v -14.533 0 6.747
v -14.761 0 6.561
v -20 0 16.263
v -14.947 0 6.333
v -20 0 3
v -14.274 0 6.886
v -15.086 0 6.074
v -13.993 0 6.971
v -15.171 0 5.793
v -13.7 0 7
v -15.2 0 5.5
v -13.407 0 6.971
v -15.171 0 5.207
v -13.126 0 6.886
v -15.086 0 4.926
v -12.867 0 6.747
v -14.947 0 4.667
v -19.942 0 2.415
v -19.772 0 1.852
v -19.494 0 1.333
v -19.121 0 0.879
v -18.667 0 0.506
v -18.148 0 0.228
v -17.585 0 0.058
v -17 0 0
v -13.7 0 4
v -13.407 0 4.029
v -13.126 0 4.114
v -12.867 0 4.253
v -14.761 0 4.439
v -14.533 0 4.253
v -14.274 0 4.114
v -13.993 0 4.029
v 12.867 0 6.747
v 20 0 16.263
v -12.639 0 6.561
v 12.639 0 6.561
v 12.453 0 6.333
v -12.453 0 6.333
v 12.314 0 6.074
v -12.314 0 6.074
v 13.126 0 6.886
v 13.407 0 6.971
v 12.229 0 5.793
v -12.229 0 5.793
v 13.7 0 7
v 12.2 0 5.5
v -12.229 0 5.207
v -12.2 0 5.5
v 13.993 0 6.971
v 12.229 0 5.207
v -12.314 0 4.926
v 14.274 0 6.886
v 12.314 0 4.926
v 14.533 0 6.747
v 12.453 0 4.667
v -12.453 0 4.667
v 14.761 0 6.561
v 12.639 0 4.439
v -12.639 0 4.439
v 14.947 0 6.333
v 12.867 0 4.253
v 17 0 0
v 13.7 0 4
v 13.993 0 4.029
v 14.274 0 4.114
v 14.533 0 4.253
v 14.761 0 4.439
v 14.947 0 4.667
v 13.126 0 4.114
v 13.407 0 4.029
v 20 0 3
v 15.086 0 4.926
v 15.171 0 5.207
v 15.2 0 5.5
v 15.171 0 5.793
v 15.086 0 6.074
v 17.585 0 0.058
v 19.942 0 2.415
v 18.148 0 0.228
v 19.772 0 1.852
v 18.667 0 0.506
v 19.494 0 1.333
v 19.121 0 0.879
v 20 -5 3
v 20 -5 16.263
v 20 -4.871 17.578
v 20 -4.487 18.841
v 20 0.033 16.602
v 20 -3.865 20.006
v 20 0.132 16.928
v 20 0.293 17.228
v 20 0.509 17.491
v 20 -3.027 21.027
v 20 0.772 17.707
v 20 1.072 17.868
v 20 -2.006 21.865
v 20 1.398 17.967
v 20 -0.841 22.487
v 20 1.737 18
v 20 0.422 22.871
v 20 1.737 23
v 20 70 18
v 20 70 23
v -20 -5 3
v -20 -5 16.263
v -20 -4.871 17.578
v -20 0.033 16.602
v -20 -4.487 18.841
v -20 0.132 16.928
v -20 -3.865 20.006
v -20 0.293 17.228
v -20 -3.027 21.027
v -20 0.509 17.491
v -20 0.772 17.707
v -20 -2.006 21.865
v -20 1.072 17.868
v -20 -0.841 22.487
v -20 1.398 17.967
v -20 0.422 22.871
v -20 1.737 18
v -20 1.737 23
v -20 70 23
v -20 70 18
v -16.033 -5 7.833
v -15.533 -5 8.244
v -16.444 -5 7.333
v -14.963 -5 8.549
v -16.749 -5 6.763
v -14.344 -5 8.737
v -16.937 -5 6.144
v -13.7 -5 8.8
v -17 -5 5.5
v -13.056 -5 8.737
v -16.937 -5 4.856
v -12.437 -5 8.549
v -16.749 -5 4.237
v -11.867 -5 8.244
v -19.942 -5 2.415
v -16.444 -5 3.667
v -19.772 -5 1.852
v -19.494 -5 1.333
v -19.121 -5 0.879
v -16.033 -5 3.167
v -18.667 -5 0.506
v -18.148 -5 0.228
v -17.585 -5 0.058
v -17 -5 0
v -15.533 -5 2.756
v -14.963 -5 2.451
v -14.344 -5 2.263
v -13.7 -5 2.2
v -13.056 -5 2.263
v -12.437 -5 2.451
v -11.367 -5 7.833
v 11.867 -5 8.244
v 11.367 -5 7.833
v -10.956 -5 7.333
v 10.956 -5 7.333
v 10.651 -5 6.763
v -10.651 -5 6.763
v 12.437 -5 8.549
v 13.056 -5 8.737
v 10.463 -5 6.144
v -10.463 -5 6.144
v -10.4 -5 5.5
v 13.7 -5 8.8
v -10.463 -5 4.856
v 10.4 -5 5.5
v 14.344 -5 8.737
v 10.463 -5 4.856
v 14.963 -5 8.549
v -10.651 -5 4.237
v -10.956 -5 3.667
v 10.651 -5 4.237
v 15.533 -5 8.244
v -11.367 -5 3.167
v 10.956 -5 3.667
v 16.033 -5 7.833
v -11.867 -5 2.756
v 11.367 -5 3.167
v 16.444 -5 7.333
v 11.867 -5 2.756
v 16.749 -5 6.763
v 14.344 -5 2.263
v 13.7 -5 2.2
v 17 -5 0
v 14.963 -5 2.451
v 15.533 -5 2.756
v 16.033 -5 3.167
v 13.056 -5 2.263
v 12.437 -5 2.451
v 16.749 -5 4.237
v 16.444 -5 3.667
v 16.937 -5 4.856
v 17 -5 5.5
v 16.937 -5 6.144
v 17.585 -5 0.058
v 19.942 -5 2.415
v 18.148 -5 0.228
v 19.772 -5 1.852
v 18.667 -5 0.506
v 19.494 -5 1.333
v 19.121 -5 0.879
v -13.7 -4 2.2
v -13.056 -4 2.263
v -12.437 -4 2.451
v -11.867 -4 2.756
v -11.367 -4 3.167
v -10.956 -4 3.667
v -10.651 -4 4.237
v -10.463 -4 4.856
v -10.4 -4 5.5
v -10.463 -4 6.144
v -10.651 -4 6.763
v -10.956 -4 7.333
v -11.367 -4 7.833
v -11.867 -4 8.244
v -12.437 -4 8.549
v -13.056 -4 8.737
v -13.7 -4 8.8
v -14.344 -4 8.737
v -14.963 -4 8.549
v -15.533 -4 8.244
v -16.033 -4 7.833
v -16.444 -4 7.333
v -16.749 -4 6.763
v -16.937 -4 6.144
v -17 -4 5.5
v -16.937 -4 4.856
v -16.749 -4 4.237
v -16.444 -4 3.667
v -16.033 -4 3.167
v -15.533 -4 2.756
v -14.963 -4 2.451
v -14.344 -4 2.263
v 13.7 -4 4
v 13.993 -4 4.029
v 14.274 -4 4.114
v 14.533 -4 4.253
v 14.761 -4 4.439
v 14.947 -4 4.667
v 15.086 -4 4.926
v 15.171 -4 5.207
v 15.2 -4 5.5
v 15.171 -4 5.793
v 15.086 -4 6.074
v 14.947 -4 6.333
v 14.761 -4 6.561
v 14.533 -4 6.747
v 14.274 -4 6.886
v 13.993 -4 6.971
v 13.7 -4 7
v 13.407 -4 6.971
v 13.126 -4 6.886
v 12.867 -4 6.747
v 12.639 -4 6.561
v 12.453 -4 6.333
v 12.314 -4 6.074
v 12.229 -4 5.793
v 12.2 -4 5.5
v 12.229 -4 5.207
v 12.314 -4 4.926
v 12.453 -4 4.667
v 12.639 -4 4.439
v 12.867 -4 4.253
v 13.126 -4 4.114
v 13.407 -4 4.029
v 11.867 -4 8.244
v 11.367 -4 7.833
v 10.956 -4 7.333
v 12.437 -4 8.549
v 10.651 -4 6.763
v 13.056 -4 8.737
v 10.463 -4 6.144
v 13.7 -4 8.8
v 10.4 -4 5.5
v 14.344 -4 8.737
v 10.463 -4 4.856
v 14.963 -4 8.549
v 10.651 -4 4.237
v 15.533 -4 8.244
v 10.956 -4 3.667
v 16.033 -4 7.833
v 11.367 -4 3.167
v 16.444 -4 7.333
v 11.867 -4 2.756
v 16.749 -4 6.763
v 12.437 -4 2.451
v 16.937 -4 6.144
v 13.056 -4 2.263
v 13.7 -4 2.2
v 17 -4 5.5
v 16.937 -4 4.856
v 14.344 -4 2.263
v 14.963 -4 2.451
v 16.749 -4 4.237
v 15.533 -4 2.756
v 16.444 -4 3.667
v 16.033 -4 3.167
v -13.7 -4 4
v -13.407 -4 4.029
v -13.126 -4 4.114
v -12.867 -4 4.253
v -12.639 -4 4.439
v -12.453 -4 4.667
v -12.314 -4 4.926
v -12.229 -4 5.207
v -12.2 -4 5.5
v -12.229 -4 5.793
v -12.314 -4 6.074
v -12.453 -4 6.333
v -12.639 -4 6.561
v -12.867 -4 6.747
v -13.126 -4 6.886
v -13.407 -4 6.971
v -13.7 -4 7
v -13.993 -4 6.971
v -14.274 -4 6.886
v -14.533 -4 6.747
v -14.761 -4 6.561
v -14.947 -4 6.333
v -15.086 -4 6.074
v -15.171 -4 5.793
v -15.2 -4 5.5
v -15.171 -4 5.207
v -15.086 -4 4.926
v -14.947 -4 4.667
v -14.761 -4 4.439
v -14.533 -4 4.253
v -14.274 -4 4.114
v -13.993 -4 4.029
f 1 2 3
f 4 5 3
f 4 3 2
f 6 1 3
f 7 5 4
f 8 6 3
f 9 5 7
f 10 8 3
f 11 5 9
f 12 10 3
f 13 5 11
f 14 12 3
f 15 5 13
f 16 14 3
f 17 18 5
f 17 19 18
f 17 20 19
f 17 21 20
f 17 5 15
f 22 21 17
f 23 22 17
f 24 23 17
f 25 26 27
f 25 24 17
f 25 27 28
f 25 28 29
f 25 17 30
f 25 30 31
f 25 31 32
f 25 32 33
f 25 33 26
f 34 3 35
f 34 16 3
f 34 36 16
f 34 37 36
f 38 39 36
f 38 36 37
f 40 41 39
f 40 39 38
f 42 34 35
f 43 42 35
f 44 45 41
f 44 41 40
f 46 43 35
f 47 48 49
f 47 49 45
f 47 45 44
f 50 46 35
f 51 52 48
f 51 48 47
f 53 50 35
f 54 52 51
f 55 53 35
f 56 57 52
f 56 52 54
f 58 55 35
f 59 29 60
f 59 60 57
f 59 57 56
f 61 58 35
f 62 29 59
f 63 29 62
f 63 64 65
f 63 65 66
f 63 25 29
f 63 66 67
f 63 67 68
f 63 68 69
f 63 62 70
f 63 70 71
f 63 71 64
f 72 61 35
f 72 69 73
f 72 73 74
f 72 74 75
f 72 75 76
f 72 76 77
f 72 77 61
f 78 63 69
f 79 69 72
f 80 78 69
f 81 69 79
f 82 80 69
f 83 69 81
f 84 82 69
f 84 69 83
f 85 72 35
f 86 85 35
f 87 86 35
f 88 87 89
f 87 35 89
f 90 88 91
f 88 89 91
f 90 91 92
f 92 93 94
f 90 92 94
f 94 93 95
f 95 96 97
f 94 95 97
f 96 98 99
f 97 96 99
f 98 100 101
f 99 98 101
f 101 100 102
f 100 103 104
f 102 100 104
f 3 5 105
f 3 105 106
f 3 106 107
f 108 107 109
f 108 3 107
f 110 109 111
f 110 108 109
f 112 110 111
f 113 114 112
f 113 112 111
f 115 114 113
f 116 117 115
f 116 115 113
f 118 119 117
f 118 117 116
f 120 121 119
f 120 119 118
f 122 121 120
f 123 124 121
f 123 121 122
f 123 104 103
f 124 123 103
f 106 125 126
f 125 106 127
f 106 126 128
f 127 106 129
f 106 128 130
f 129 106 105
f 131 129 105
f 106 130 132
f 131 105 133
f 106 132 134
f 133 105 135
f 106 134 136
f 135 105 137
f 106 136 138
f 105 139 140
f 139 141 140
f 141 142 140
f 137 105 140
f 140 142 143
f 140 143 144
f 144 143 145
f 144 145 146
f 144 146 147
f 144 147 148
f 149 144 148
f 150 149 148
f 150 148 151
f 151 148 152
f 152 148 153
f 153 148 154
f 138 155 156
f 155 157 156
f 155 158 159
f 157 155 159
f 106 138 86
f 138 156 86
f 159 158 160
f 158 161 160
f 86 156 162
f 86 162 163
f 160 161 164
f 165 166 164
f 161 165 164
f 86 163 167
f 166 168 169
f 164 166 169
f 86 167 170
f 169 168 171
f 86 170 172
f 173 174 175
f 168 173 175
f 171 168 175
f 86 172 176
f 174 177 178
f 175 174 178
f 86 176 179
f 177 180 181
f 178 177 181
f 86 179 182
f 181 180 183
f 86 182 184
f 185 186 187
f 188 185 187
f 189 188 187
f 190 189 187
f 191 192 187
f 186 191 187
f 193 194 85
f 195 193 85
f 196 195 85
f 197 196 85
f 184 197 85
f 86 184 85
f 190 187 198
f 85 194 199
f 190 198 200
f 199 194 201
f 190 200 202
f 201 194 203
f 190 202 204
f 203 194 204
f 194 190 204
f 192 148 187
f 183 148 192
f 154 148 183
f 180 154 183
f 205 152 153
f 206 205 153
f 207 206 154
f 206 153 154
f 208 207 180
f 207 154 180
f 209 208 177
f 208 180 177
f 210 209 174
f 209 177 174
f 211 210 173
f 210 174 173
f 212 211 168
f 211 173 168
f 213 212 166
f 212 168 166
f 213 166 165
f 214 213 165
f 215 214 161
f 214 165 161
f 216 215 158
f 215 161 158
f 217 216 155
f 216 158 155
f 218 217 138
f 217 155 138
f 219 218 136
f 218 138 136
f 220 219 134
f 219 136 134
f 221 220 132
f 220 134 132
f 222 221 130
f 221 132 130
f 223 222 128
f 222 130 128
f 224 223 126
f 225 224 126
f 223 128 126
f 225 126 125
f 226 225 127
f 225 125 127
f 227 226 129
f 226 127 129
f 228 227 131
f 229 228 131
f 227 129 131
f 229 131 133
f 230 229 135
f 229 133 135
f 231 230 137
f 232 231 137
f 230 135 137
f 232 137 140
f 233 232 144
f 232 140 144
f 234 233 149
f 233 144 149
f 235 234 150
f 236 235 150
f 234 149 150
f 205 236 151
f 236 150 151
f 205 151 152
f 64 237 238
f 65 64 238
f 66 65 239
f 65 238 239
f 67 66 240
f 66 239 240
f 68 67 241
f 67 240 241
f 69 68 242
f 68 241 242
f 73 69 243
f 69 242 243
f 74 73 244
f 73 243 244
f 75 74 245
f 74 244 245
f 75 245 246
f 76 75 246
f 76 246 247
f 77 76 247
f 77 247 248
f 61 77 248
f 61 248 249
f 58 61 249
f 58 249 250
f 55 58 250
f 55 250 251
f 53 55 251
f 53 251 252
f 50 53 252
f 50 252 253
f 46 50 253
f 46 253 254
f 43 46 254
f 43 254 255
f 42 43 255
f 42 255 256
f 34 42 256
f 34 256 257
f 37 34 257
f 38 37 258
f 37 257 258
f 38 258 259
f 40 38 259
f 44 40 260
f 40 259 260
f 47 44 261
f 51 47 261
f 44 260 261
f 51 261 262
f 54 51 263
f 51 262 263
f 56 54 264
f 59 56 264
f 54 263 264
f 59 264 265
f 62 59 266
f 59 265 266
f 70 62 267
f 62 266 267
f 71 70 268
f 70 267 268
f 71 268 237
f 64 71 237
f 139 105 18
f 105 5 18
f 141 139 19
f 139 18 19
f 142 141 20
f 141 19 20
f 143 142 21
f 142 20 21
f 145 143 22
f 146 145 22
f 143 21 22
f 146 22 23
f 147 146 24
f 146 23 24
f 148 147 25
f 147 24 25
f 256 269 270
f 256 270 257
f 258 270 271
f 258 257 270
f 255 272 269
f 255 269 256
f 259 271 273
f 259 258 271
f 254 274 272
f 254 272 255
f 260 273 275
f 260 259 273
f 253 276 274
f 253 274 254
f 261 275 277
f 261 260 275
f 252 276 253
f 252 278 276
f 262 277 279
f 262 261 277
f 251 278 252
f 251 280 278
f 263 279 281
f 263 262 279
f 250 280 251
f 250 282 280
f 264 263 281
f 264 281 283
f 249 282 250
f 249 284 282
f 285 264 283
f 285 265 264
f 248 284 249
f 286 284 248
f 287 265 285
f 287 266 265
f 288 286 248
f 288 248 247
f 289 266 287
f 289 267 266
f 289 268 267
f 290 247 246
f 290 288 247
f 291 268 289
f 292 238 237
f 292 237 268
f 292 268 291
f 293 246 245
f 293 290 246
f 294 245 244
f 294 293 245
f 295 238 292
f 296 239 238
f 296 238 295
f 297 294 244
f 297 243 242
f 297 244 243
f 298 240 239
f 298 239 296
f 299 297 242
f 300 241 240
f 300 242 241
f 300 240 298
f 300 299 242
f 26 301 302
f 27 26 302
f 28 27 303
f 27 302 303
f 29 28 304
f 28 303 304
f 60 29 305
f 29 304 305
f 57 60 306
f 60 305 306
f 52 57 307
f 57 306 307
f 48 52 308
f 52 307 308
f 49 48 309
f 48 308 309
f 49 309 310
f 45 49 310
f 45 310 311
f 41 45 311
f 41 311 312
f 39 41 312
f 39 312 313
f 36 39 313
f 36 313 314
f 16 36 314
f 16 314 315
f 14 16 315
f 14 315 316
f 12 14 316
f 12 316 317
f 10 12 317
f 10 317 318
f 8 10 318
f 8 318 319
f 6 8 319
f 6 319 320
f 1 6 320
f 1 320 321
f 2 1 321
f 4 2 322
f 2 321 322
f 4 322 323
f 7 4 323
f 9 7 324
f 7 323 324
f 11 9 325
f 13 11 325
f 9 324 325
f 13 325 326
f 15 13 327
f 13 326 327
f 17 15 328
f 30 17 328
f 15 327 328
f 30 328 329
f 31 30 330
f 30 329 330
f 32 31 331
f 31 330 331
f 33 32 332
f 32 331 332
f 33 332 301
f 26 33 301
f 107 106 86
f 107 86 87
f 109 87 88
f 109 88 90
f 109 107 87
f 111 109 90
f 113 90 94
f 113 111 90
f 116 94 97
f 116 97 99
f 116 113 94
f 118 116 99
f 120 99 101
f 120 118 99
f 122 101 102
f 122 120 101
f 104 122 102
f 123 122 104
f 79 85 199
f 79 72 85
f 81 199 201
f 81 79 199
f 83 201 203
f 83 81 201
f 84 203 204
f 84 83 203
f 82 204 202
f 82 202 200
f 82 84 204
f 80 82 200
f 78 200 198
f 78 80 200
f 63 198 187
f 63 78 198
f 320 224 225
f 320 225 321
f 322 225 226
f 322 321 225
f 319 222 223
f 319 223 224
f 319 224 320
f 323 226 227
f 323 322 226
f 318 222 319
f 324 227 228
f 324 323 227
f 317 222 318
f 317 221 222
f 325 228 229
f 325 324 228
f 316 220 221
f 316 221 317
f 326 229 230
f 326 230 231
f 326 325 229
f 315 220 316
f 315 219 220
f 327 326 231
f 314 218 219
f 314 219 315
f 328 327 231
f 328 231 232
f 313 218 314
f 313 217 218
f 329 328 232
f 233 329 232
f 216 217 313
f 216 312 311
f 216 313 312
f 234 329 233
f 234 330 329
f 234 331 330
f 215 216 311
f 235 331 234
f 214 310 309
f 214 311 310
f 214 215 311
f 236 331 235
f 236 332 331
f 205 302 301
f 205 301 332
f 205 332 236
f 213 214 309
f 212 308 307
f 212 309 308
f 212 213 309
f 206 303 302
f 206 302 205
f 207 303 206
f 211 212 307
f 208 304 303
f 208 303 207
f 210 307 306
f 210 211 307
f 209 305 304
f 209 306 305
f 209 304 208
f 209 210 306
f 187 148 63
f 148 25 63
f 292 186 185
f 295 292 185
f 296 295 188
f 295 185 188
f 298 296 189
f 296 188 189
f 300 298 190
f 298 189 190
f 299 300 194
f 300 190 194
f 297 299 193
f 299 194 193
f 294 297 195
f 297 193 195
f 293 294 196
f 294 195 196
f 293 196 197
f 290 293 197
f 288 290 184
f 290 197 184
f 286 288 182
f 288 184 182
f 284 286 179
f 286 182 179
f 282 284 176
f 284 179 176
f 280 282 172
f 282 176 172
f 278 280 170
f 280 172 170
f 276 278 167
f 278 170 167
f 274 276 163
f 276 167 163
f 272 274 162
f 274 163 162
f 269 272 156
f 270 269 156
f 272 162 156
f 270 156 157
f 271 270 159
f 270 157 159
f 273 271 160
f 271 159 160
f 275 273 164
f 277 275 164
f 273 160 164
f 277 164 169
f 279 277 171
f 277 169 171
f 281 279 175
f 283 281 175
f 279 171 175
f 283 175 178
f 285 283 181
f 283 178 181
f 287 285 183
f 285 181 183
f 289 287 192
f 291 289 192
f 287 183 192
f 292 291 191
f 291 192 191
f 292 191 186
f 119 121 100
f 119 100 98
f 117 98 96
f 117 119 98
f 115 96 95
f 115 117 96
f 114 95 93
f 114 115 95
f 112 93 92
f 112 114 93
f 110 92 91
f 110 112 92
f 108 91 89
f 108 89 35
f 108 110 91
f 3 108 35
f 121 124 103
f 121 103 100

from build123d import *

# Parameters (mm, degrees)
SKETCH_13_W                      = 40
SKETCH_13_H                      = 5
SM_BASE_FLANGE_1_DEPTH           = 18
SM_EDGE_FLANGE_1_STRIP_W         = 23.4732
SM_EDGE_FLANGE_1_STRIP_H         = 5
SM_EDGE_FLANGE_1_STRIP_CUT_DEPTH = 40
SM_EDGE_FLANGE_1_DEPTH           = 40
SKETCH_26_R                      = 1.5
CUT_EXTRUDE_1_DEPTH              = 81.956778592
FILLET_1_R                       = 3
SKETCH_32_R                      = 3.3
CUT_EXTRUDE_4_DEPTH              = 1


# Sheet-metal steps are written as plain solids
with BuildPart() as part:
    # 草图13 → 基体-法兰1 (new body)
    with BuildSketch(Plane.XY):
        with Locations((0, -2.5)):
            Rectangle(SKETCH_13_W, SKETCH_13_H)
    extrude(amount=SM_BASE_FLANGE_1_DEPTH)

    # 边线-法兰1 strip (across the edge) → 边线-法兰1 strip cut (cut)
    with BuildSketch(Plane(origin=(-20, 0, 18), x_dir=(0, 0, -1), z_dir=(1, 0, 0))):
        with Locations((-10, -2.5)):
            Rectangle(SM_EDGE_FLANGE_1_STRIP_W, SM_EDGE_FLANGE_1_STRIP_H)
    extrude(amount=SM_EDGE_FLANGE_1_STRIP_CUT_DEPTH, mode=Mode.SUBTRACT)

    # 边线-法兰1 section (across the edge) → 边线-法兰1 (add)
    with BuildSketch(Plane(origin=(-20, 0, 18), x_dir=(0, 0, -1), z_dir=(1, 0, 0))):
        with BuildLine():
            Line((-5, 1.7366), (-5, 70))
            Line((-5, 70), (0, 70))
            Line((0, 70), (0, 1.7366))
            ThreePointArc((0, 1.7366), (0.508638364, 0.508638364), (1.7366, 0))
            Line((1.7366, 0), (1.7366, -5))
            ThreePointArc((1.7366, -5), (-3.026895542, -3.026895542), (-5, 1.7366))
        make_face()
    extrude(amount=SM_EDGE_FLANGE_1_DEPTH)

    # 草图26 → 切除-拉伸1 (cut, through all)
    with BuildSketch(Plane.XZ.offset(5)):
        with Locations(Location((-13.7, 5.5, 0), (0, 0, 270))):
            Circle(SKETCH_26_R)
        with Locations(Location((13.7, 5.5, 0), (0, 0, 270))):
            Circle(SKETCH_26_R)
    extrude(amount=-CUT_EXTRUDE_1_DEPTH, mode=Mode.SUBTRACT)

    # 圆角1
    fillet_1_edges = [part.edges().sort_by_distance(p)[0] for p in [
        (-20, -2.5, 0),
        (20, -2.5, 0),
    ]]
    fillet(fillet_1_edges, radius=FILLET_1_R)

    # 草图32 → 切除-拉伸4 (cut)
    with BuildSketch(Plane(origin=(0, -5, 0), x_dir=(-1, 0, 0), z_dir=(0, -1, 0))):
        with Locations(Location((13.7, -5.5, 0), (0, 0, 90))):
            Circle(SKETCH_32_R)
        with Locations(Location((-13.7, -5.5, 0), (0, 0, 90))):
            Circle(SKETCH_32_R)
    extrude(amount=-CUT_EXTRUDE_4_DEPTH, mode=Mode.SUBTRACT)


solid = part.part
